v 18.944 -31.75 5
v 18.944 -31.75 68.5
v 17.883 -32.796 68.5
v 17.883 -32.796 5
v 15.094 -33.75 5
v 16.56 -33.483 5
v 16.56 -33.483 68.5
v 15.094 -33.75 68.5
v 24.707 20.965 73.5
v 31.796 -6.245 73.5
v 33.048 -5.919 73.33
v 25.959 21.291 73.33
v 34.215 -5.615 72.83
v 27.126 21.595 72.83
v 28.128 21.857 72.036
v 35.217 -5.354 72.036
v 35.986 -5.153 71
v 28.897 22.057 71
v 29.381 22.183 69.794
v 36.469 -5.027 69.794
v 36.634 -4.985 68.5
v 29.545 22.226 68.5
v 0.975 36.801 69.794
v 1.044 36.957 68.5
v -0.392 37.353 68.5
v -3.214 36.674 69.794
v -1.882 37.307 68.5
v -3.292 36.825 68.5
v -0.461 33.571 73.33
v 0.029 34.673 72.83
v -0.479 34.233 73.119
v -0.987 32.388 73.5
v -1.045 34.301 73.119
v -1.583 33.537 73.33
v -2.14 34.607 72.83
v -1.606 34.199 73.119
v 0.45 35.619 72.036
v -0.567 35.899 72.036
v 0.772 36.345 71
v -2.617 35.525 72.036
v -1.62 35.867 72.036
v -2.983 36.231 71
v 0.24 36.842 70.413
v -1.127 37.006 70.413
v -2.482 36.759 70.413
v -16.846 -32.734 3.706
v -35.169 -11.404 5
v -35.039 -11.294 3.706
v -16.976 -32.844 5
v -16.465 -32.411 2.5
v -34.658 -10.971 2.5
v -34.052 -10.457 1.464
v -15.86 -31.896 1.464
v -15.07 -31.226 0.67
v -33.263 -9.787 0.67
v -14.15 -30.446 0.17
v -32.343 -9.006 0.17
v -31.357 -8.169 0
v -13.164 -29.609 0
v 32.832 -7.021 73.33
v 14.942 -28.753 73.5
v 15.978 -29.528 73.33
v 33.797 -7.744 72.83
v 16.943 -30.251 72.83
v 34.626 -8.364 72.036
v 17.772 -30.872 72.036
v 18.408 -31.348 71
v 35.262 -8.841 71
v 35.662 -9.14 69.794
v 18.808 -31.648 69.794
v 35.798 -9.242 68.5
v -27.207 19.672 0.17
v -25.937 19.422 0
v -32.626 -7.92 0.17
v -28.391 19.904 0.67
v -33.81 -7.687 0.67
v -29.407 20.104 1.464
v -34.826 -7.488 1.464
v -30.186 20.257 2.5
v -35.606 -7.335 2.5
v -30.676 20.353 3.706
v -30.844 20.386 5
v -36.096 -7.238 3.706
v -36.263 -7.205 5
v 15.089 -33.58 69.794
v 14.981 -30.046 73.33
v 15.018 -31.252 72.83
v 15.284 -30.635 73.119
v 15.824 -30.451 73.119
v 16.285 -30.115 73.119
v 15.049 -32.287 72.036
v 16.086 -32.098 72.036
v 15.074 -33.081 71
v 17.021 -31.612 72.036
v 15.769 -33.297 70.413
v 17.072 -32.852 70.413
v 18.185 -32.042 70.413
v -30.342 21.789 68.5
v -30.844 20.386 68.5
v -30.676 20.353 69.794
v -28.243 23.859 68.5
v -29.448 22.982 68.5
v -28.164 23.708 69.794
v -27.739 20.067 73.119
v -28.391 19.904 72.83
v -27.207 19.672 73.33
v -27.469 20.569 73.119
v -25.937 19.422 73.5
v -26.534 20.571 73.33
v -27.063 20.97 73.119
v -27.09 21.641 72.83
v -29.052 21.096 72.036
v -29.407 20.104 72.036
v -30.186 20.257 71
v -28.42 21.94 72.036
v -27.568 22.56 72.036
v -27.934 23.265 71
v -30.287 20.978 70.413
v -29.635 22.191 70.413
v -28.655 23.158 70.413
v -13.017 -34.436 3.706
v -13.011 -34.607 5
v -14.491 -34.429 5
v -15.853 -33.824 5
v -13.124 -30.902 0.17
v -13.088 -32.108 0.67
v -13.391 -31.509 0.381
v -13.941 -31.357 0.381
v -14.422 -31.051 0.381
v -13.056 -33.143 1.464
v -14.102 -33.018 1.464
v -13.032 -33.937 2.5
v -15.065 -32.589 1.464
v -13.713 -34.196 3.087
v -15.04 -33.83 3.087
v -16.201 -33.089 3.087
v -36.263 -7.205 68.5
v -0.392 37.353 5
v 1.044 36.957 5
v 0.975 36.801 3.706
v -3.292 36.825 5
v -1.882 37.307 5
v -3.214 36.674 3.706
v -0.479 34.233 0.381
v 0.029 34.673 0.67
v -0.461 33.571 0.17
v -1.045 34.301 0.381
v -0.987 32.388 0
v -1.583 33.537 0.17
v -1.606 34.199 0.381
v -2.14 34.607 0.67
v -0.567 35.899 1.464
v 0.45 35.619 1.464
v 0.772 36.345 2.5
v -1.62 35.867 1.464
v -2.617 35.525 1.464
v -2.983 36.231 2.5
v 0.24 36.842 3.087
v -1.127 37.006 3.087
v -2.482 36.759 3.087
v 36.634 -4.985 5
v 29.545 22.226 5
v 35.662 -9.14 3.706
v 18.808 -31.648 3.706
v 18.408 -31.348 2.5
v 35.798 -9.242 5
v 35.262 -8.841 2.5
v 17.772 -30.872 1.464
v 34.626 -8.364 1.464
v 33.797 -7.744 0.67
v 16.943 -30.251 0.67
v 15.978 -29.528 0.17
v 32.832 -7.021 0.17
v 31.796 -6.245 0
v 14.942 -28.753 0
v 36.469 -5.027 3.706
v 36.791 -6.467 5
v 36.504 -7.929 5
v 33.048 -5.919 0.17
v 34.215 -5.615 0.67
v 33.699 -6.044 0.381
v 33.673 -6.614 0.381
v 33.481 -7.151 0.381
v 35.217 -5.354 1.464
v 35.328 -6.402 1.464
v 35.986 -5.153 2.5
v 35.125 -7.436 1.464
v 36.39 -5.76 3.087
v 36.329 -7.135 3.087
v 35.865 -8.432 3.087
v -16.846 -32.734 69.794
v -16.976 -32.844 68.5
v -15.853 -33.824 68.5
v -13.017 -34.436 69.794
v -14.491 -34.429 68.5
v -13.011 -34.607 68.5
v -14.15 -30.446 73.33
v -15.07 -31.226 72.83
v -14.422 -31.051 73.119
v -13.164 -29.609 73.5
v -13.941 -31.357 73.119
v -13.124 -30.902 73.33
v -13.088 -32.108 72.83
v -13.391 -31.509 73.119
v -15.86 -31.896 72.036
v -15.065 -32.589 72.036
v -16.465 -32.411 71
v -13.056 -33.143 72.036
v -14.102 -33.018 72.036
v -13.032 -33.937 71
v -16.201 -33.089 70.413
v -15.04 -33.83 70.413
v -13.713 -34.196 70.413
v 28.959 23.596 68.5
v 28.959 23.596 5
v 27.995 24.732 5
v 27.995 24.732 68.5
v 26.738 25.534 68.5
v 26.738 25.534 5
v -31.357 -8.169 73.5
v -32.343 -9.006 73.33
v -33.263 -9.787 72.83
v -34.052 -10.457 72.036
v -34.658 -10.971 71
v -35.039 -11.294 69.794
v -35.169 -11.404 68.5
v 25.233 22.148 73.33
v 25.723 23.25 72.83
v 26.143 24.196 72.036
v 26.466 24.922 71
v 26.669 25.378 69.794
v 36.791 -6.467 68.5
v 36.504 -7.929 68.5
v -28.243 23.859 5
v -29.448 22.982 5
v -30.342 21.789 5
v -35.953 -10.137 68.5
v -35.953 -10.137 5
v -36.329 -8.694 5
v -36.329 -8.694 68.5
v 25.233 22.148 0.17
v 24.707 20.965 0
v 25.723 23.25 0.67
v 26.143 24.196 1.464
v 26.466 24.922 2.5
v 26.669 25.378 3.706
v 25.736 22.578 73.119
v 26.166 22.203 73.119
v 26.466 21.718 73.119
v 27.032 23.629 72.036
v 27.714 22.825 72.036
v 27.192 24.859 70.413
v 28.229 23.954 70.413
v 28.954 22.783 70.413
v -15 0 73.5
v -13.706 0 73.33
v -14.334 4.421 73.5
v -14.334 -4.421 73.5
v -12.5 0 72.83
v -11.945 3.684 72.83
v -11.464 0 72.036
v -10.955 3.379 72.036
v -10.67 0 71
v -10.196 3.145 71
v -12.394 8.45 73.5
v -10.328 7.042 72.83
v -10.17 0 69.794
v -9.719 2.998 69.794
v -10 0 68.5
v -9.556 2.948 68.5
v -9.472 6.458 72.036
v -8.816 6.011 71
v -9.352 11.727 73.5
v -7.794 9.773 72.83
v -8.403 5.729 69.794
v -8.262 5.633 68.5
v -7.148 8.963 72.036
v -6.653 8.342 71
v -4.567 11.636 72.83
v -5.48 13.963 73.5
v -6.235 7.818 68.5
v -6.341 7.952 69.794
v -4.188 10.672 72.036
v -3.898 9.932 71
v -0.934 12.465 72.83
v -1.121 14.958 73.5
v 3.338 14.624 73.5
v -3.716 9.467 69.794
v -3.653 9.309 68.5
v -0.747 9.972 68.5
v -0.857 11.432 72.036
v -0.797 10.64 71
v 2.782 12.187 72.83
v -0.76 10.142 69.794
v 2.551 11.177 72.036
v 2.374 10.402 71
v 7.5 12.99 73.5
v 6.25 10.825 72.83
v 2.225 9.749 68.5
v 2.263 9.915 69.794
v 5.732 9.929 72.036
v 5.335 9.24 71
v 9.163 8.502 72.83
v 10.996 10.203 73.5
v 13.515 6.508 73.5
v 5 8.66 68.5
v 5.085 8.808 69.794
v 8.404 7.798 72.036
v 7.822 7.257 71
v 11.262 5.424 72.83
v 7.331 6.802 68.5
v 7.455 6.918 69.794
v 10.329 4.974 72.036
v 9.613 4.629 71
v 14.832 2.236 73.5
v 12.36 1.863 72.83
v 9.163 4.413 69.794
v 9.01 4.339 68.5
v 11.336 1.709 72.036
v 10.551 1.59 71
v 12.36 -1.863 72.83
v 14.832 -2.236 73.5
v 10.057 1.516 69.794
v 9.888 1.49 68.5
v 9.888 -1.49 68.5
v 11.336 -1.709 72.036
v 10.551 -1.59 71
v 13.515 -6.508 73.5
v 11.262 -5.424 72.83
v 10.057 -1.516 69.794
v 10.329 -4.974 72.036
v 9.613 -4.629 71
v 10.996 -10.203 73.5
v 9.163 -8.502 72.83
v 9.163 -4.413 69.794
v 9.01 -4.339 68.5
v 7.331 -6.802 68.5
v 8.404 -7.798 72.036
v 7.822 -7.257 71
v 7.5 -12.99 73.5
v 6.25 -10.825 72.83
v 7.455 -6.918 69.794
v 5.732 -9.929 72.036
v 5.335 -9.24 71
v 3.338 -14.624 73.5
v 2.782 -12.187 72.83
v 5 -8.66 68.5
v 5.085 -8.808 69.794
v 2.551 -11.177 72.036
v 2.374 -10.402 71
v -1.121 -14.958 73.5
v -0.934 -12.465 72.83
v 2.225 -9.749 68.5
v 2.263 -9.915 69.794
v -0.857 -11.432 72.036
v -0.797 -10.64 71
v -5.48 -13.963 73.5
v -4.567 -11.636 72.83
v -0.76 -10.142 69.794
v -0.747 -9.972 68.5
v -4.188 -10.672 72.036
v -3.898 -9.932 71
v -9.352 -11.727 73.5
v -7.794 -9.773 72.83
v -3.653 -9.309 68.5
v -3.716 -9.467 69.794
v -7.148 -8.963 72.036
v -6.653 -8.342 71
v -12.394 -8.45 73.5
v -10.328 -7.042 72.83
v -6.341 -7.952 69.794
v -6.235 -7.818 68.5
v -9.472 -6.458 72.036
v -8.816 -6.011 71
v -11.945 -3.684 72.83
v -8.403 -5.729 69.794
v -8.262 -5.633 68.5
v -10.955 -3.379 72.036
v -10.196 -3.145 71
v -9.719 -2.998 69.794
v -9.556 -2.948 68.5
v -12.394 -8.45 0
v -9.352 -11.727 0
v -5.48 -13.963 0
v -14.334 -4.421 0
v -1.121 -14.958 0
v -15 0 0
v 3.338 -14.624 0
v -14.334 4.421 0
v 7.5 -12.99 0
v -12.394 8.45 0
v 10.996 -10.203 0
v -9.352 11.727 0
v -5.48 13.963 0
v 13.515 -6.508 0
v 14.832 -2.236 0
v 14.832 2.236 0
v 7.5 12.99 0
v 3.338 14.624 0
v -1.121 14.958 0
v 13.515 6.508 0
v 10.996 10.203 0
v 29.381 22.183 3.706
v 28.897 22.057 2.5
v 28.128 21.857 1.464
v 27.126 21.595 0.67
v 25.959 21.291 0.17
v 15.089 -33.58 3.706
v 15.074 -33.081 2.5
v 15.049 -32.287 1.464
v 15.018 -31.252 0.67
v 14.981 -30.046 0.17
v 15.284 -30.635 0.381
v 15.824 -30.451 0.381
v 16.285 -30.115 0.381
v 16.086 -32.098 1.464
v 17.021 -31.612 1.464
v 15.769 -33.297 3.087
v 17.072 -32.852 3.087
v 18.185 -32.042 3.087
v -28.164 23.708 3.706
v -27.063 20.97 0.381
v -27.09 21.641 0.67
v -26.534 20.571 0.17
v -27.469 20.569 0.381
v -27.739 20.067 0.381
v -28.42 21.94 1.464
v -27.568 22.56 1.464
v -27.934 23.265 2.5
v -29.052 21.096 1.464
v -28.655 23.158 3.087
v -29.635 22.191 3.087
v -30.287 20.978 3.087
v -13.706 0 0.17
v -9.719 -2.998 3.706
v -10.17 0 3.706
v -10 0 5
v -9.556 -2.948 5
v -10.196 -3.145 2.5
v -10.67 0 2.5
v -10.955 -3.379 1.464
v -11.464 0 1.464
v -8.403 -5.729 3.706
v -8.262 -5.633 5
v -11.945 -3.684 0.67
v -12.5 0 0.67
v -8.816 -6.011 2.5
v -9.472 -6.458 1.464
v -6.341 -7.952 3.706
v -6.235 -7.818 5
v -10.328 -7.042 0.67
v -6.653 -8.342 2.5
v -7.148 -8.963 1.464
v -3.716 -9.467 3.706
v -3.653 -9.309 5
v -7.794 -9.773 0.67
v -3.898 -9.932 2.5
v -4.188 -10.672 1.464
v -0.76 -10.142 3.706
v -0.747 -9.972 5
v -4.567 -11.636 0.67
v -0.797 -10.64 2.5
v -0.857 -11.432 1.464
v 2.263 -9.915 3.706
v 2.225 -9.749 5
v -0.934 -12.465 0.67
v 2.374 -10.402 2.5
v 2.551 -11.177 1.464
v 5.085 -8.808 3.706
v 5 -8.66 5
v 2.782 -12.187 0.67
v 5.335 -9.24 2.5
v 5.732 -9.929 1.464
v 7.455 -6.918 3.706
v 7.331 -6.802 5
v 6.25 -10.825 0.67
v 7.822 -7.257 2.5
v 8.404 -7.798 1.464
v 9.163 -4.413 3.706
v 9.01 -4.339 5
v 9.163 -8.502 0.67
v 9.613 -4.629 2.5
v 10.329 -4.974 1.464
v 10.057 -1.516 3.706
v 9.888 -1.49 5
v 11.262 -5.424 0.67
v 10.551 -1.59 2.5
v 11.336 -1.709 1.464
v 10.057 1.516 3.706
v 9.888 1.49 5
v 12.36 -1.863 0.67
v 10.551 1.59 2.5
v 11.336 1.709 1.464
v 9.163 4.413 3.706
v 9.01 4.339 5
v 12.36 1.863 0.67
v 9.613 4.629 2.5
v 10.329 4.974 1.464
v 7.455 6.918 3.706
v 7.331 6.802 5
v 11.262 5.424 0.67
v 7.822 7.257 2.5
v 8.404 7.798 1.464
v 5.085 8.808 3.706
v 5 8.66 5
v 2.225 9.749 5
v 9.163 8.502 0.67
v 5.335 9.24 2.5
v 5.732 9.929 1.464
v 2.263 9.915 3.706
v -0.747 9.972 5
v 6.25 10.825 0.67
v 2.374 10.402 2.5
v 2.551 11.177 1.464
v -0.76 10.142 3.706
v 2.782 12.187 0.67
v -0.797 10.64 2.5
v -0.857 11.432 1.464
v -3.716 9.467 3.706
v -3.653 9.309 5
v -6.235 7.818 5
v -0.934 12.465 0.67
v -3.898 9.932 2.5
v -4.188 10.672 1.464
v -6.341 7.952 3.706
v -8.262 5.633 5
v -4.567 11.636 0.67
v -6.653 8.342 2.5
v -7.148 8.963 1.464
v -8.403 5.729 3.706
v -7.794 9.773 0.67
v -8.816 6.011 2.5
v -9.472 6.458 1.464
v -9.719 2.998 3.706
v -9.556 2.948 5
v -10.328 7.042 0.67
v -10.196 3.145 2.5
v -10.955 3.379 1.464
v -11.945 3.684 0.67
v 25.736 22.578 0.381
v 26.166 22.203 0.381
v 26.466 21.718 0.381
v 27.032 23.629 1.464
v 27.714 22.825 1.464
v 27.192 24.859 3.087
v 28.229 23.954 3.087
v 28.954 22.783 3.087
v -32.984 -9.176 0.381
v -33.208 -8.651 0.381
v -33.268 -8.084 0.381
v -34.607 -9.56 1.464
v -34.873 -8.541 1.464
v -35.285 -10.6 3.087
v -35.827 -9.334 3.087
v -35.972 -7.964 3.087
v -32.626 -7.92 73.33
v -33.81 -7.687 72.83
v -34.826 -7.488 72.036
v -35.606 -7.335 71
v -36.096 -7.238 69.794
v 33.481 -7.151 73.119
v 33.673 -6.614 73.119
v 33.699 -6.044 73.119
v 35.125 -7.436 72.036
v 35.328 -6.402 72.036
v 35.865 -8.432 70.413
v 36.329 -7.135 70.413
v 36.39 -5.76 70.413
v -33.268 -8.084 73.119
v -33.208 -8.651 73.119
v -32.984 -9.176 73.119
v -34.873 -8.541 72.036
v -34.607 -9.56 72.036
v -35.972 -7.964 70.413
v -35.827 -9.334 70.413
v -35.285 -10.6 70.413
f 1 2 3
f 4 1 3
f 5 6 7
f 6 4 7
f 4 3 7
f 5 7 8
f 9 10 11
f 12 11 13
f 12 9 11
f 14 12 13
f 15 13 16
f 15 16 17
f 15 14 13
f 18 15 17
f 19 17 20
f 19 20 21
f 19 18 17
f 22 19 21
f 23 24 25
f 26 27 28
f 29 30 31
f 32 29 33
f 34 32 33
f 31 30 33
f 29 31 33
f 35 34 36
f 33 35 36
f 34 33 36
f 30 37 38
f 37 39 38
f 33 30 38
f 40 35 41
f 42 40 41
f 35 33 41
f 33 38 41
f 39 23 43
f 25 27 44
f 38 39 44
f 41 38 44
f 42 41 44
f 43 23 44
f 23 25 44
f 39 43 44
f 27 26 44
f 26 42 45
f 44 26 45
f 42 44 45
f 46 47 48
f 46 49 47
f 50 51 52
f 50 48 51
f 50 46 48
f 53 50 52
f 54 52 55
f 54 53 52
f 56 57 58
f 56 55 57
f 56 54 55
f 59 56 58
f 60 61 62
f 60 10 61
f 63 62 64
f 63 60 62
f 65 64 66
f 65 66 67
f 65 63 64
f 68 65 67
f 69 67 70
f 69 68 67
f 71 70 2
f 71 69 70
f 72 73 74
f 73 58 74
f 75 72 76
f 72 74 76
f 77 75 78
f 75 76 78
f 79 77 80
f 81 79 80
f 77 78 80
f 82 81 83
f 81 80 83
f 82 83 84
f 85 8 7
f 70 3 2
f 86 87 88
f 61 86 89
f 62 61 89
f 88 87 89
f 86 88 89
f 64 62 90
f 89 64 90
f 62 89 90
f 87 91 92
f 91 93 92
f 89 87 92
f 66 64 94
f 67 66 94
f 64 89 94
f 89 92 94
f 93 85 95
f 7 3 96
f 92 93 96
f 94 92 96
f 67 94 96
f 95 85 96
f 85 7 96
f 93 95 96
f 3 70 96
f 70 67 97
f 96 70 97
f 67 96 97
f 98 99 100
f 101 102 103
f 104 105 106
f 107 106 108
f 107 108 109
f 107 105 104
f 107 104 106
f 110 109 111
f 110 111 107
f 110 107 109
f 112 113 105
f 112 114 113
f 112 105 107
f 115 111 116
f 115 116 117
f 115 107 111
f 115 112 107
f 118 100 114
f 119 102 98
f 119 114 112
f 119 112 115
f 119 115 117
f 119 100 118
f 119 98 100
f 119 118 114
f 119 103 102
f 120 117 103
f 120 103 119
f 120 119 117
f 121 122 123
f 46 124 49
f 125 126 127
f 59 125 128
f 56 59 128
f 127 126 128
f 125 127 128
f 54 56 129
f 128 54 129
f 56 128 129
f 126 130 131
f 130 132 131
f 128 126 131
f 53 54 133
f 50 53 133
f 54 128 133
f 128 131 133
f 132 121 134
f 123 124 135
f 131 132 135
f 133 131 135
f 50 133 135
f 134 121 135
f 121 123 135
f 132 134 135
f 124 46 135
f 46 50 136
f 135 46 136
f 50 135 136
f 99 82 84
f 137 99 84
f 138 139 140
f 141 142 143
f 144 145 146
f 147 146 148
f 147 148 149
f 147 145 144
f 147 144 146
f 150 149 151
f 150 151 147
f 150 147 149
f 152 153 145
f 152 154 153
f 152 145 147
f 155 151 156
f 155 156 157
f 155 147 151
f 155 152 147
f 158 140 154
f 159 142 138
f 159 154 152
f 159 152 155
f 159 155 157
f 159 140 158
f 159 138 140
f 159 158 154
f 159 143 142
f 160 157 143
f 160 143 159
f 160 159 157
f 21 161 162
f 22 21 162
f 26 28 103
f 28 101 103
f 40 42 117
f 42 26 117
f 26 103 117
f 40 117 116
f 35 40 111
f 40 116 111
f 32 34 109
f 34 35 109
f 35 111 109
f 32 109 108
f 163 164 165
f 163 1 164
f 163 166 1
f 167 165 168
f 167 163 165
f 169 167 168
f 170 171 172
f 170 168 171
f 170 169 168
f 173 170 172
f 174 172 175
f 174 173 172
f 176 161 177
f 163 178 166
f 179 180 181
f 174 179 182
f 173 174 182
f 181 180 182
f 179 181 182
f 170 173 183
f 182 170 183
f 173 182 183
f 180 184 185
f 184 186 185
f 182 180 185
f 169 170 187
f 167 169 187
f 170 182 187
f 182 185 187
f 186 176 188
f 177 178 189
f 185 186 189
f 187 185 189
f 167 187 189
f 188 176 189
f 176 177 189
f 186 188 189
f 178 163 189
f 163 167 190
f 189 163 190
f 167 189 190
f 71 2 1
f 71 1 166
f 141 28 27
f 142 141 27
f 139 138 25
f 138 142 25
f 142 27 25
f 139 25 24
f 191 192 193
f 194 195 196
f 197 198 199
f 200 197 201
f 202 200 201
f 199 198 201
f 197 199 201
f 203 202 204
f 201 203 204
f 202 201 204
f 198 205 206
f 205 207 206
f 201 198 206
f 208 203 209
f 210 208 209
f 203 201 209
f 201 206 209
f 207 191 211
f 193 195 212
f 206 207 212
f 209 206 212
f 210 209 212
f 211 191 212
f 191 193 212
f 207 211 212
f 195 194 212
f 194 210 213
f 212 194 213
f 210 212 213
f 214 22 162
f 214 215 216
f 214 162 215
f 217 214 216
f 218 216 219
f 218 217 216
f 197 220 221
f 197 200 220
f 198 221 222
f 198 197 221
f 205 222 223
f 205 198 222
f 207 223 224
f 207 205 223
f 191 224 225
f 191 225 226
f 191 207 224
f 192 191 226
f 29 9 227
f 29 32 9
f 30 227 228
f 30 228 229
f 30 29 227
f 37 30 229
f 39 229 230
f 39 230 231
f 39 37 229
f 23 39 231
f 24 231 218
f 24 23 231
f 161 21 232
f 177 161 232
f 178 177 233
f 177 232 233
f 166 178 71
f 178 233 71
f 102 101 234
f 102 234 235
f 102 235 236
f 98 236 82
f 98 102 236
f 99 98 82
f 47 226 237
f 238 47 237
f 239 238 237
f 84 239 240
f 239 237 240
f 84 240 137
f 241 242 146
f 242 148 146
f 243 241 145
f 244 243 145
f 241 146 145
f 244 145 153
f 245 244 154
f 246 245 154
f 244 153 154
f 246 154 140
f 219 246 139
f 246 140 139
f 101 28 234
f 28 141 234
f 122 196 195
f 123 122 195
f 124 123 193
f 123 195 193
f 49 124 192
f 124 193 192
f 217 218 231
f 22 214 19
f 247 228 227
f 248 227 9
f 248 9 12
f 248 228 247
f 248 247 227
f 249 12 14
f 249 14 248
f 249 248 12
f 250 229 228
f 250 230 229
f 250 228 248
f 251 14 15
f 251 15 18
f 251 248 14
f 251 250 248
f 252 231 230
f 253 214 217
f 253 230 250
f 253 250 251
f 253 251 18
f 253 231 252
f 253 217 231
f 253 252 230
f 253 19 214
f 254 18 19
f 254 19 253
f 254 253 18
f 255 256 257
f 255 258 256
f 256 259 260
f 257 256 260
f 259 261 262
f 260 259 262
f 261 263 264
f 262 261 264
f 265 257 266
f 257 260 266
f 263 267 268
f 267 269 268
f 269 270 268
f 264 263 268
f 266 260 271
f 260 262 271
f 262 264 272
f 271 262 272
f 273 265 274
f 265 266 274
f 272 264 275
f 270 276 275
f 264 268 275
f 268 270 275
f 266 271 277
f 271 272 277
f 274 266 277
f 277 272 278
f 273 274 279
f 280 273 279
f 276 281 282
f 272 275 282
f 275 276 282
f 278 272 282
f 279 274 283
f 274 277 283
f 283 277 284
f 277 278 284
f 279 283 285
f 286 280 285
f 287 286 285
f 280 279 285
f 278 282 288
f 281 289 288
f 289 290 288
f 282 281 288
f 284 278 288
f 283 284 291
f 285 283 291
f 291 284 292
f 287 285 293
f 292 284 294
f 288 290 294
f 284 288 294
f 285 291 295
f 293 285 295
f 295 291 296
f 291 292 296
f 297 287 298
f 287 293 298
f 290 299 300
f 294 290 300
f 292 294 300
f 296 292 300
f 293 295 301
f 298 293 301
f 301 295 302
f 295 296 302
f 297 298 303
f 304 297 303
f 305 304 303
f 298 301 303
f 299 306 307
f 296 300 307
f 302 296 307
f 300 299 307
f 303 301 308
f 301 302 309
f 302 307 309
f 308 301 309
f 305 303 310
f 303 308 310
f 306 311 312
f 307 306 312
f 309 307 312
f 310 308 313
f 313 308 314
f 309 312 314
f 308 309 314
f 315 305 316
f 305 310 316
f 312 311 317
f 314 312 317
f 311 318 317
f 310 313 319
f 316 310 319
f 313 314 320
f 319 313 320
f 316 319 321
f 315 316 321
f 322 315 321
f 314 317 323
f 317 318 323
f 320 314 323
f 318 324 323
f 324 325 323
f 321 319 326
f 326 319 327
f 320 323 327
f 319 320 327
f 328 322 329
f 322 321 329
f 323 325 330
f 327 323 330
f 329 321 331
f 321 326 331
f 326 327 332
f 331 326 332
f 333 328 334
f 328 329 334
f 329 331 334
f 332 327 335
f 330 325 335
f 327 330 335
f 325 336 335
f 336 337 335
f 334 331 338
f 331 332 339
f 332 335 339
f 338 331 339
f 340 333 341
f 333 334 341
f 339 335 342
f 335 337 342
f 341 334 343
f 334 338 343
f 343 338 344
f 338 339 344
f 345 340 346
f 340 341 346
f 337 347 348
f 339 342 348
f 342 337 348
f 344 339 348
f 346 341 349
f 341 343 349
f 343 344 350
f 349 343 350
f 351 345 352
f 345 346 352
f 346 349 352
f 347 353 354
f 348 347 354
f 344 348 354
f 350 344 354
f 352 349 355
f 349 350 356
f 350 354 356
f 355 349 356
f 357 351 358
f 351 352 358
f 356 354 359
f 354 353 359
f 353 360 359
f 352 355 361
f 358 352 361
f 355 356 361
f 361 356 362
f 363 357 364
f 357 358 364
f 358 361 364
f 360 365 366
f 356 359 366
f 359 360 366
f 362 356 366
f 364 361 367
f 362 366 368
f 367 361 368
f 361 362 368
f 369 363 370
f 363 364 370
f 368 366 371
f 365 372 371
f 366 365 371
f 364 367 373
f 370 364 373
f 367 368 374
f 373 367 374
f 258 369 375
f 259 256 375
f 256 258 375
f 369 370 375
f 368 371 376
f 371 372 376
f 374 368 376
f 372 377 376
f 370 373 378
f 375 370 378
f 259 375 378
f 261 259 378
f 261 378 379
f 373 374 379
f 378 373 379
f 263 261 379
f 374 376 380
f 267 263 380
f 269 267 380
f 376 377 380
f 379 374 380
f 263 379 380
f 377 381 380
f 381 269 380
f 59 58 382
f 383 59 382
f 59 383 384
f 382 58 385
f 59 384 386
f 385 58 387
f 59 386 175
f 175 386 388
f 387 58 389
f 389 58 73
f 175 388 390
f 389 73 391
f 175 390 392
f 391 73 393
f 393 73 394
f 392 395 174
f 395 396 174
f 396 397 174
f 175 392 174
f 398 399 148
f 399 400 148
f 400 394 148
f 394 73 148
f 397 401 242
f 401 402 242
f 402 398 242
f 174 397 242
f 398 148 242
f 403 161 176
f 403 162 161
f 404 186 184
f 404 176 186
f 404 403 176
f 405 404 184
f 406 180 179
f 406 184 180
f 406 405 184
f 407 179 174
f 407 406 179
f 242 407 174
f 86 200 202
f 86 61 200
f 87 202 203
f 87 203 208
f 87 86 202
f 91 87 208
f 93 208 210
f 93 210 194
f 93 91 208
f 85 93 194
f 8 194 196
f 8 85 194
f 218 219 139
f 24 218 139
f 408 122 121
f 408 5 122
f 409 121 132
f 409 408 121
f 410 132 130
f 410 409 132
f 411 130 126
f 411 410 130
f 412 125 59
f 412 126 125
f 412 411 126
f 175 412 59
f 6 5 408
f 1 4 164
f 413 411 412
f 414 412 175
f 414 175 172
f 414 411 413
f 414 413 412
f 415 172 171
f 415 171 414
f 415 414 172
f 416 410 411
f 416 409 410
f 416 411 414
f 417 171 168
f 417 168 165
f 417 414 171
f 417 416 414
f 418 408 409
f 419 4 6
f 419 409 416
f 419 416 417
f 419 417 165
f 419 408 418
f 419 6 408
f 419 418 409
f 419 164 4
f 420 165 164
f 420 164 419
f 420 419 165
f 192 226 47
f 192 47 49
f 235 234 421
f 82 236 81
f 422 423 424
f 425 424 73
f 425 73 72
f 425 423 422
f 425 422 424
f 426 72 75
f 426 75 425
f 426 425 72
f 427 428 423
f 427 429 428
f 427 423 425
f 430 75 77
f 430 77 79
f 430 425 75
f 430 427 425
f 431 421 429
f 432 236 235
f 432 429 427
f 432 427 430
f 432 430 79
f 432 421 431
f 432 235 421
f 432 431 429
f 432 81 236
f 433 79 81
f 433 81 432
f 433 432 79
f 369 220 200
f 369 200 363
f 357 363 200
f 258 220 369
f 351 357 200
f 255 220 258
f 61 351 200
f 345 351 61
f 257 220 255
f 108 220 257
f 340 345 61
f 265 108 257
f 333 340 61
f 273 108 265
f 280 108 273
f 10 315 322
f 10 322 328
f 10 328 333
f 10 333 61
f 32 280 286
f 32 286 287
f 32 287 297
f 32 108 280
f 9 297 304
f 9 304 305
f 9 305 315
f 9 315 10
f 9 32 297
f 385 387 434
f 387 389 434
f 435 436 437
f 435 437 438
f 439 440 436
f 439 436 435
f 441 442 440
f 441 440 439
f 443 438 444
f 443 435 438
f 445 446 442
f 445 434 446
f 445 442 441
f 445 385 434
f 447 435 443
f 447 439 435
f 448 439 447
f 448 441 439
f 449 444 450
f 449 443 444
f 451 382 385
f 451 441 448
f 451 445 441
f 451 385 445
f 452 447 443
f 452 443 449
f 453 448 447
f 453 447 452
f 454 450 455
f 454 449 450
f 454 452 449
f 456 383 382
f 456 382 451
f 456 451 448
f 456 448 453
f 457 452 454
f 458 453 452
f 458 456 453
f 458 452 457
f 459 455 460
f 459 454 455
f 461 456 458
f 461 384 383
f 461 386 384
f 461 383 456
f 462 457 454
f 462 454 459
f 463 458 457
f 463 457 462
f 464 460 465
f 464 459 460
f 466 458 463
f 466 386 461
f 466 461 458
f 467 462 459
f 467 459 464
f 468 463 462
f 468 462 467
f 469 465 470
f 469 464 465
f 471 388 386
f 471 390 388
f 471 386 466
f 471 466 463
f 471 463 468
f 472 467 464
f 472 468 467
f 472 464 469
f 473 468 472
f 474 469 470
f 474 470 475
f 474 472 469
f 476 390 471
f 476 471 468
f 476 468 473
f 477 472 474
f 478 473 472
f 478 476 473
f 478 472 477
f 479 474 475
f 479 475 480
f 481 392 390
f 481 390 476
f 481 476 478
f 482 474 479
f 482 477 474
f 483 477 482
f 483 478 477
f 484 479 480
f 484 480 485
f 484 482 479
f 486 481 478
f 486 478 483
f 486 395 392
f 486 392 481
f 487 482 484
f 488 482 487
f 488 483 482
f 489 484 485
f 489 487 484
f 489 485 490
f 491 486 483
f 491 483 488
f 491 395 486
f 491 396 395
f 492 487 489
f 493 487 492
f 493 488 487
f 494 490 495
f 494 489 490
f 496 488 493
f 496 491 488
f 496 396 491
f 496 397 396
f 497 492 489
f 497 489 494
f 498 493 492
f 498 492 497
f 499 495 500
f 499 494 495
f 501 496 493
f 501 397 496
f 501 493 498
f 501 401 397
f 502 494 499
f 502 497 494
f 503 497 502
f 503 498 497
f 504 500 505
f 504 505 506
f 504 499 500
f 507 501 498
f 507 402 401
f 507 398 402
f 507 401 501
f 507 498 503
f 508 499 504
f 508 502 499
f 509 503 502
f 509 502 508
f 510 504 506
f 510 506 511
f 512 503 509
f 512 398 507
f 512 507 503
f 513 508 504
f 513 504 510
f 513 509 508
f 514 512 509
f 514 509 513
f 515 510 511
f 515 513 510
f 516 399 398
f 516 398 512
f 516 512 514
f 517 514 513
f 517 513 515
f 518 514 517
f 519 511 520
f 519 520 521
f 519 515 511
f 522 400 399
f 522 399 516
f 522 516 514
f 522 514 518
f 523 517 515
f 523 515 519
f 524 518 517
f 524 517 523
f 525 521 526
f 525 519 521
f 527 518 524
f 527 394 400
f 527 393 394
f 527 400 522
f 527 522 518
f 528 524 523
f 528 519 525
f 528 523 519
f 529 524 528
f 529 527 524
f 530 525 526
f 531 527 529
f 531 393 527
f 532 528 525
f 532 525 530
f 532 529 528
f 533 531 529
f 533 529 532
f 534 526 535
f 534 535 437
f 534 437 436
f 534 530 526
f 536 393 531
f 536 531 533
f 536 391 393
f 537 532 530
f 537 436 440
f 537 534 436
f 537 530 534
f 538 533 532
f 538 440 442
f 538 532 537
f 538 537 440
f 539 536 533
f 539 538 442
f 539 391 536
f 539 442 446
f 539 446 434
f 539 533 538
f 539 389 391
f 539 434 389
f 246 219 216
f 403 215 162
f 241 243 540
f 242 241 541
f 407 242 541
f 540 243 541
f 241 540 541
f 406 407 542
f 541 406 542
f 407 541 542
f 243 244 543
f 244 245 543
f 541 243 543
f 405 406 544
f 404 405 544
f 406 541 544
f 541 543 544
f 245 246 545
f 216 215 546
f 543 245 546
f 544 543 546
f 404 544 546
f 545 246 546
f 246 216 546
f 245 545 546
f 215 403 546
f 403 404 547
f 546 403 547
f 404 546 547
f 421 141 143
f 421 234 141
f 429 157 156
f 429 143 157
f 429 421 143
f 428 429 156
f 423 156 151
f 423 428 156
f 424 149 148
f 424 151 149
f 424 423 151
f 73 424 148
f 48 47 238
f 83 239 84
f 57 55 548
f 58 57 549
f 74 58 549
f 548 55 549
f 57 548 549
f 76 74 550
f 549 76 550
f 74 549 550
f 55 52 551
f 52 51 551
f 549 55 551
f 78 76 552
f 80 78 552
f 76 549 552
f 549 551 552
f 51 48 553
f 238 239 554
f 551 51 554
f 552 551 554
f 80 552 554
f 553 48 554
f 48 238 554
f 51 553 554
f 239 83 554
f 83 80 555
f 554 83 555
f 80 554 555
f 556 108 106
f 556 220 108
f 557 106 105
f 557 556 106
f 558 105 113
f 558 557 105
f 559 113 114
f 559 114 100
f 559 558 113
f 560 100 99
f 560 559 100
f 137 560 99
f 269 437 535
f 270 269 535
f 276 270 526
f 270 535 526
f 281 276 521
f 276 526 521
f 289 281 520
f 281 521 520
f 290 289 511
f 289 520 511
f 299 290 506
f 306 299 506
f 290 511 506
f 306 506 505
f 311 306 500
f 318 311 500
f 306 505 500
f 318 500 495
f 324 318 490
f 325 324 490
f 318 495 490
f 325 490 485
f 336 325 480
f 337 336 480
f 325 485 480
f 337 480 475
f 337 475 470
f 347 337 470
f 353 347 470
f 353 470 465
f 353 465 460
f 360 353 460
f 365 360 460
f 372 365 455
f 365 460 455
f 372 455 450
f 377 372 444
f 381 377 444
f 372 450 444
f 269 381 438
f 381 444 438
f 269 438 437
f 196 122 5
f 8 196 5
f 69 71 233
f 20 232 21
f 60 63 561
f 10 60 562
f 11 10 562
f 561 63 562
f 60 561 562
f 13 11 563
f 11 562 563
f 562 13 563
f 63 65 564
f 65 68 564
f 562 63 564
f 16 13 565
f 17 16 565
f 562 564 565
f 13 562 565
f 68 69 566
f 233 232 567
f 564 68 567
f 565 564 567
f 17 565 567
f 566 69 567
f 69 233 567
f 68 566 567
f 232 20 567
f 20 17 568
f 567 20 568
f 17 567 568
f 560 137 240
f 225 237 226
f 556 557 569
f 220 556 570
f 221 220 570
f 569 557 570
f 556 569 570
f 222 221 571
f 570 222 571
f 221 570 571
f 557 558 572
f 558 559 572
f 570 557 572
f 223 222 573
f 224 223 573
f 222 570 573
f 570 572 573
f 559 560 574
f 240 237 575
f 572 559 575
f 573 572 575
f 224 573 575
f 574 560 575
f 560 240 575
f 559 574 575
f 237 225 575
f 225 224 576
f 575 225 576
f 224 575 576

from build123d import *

# Parameters (mm, degrees)
F1_DEPTH       = 73.5
F3_D           = 20
F3_CBORE_D     = 20
F3_CBORE_DEPTH = 20
F4_R           = 5


# Not quite as in the source:
# - two fillets or chamfers of one size are made in one step


with BuildPart() as f1:
    # F0 (on Top) → F1 (new body)
    with BuildSketch(Plane.XY):
        Polygon((-1.1557375875, 37.9352838977), (-30.379589847, 22.7486706094), (-36.726991321, -9.568155636), (-15.4182192362, -34.6799655328), (17.5007864078, -33.6770540409), (37.2413429358, -7.3146339696), (28.9384086481, 24.5558546722), align=None)
    extrude(amount=F1_DEPTH)

    # F3 (through all)
    with Locations(Plane.XY.offset(73.5)):
        with Locations((0, 0)):
            CounterBoreHole(F3_D / 2, F3_CBORE_D / 2, F3_CBORE_DEPTH)

    # F4
    f4_edges = [f1.edges().sort_by_distance(p)[0] for p in [
        (-26.072605, -22.124061, 0),
        (-33.553291, 6.590257, 0),
        (-36.726991, -9.568156, 36.75),
        (-15.418219, -34.679966, 36.75),
        (-33.553291, 6.590257, 73.5),
        (-26.072605, -22.124061, 73.5),
        (-15.767664, 30.341977, 73.5),
        (-30.37959, 22.748671, 36.75),
        (-1.155738, 37.935284, 36.75),
        (28.938409, 24.555855, 36.75),
        (13.891336, 31.245569, 73.5),
        (33.089876, 8.62061, 73.5),
        (13.891336, 31.245569, 0),
        (33.089876, 8.62061, 0),
        (1.041284, -34.17851, 0),
        (27.371065, -20.495844, 0),
        (17.500786, -33.677054, 36.75),
        (37.241343, -7.314634, 36.75),
        (1.041284, -34.17851, 73.5),
        (27.371065, -20.495844, 73.5),
        (-15.767664, 30.341977, 0),
        (-10, 0, 0),
        (-10, 0, 73.5),
    ]]
    fillet(f4_edges, radius=F4_R)


solid = f1.part
